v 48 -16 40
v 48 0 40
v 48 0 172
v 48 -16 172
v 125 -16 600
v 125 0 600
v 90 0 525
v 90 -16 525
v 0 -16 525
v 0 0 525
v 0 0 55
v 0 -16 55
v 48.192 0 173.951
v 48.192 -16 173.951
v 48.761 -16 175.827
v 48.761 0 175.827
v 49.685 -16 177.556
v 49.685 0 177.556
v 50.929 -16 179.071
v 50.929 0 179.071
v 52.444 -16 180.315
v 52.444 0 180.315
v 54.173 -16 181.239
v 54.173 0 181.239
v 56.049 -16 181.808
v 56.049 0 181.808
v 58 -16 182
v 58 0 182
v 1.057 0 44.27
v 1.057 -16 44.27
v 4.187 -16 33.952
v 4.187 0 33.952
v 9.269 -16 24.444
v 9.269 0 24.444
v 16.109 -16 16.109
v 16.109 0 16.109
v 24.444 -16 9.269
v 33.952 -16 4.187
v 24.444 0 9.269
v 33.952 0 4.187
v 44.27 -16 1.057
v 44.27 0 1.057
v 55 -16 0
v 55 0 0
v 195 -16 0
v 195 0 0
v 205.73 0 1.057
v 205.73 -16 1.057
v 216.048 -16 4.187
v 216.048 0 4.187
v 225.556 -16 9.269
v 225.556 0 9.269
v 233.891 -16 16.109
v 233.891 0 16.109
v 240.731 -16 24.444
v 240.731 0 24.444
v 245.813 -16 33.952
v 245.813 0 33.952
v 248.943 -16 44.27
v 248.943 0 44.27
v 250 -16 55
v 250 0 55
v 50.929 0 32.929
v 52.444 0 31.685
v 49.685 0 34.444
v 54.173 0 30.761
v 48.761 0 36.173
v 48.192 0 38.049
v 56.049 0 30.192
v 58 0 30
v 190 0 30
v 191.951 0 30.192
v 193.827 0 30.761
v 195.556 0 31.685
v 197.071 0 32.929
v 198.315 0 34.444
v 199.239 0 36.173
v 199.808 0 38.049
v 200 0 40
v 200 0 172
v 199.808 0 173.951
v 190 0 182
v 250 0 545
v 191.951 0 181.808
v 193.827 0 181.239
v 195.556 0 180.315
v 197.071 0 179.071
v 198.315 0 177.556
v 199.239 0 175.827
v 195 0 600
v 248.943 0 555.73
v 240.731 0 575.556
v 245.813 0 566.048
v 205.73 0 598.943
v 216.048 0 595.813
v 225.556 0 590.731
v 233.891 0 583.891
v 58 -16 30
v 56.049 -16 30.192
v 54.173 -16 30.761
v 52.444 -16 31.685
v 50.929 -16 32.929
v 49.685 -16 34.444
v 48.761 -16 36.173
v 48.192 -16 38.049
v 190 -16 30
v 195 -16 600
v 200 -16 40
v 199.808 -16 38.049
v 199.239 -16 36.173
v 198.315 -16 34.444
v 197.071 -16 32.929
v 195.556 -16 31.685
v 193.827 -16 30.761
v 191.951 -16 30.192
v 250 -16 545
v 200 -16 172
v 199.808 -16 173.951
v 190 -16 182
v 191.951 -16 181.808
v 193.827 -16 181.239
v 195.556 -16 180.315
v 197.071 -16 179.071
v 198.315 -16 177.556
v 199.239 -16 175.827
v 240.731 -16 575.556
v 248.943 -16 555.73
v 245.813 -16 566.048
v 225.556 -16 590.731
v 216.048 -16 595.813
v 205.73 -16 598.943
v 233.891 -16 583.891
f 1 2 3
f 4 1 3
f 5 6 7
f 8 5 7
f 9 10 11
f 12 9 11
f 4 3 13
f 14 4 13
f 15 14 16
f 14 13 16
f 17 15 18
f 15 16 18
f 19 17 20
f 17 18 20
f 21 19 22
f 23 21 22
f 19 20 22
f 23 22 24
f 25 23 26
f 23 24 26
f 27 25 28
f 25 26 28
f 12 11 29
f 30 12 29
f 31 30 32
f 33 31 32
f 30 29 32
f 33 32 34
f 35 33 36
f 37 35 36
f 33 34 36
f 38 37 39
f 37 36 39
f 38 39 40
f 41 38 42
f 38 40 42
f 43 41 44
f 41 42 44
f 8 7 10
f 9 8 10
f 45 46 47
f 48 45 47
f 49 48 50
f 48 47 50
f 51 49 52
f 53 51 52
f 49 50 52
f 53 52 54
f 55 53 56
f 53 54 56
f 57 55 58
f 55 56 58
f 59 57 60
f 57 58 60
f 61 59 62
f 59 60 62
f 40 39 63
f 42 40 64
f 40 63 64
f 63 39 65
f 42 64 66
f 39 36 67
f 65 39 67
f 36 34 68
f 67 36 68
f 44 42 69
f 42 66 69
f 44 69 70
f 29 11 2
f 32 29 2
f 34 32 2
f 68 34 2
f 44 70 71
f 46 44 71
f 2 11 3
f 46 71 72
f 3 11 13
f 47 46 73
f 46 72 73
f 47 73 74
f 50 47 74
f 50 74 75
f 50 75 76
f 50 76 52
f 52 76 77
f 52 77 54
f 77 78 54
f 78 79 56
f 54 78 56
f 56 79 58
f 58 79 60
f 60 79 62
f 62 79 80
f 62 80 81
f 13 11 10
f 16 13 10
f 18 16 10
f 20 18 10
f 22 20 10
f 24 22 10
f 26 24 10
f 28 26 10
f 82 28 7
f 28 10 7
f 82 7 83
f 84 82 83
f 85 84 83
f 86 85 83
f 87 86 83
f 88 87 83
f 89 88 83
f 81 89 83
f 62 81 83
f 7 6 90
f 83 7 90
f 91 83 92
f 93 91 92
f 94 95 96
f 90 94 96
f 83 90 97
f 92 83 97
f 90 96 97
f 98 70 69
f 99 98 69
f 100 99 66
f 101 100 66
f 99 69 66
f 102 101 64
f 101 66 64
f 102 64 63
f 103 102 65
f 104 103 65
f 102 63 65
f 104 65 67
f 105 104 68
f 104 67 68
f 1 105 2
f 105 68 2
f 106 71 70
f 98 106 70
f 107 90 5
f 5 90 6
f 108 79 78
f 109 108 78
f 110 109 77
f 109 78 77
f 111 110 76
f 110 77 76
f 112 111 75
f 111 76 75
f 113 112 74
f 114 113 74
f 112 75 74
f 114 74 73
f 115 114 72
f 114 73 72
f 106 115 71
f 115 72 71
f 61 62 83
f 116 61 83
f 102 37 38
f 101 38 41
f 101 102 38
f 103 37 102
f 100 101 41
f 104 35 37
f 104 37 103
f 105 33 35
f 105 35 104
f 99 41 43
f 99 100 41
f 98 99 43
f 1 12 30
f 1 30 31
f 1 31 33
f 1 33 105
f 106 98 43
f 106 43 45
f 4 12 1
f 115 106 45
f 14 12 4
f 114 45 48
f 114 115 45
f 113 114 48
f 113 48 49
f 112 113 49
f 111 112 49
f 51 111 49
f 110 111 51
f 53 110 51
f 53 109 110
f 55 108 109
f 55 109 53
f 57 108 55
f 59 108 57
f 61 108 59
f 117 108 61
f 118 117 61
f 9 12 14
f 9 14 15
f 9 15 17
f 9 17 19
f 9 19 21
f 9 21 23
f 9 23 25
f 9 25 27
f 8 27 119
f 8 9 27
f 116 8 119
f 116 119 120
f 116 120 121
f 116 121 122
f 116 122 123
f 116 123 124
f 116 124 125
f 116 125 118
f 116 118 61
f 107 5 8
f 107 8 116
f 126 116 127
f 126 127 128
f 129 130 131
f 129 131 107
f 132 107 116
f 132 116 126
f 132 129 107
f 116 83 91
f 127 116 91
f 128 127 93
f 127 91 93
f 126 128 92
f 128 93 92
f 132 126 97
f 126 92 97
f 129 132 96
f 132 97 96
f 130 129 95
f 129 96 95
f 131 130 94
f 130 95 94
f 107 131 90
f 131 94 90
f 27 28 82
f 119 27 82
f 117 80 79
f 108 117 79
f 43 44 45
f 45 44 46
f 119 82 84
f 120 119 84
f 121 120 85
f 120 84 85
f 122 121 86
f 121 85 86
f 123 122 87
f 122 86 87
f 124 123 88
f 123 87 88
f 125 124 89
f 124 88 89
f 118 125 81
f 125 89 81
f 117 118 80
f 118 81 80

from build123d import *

# Parameters (mm, degrees)
F1_DEPTH = 16


with BuildPart() as f1:
    # F0 (on Front) → F1 (new body)
    with BuildSketch(Plane.XZ):
        with BuildLine():
            ThreePointArc((0, 55), (16.109127, 16.109127), (55, 0))
            Line((55, 0), (195, 0))
            ThreePointArc((195, 0), (233.890873, 16.109127), (250, 55))
            Line((250, 55), (250, 545))
            ThreePointArc((250, 545), (233.890873, 583.890873), (195, 600))
            Line((195, 600), (125, 600))
            Line((125, 600), (90, 525))
            Line((90, 525), (0, 525))
            Line((0, 525), (0, 55))
        make_face()
        with BuildLine():
            ThreePointArc((48, 172), (50.928932, 179.071068), (58, 182))
            Line((58, 182), (190, 182))
            ThreePointArc((190, 182), (197.071068, 179.071068), (200, 172))
            Line((200, 172), (200, 40))
            ThreePointArc((200, 40), (197.071068, 32.928932), (190, 30))
            Line((190, 30), (58, 30))
            ThreePointArc((58, 30), (50.928932, 32.928932), (48, 40))
            Line((48, 40), (48, 172))
        make_face(mode=Mode.SUBTRACT)
    extrude(amount=F1_DEPTH)


solid = f1.part
